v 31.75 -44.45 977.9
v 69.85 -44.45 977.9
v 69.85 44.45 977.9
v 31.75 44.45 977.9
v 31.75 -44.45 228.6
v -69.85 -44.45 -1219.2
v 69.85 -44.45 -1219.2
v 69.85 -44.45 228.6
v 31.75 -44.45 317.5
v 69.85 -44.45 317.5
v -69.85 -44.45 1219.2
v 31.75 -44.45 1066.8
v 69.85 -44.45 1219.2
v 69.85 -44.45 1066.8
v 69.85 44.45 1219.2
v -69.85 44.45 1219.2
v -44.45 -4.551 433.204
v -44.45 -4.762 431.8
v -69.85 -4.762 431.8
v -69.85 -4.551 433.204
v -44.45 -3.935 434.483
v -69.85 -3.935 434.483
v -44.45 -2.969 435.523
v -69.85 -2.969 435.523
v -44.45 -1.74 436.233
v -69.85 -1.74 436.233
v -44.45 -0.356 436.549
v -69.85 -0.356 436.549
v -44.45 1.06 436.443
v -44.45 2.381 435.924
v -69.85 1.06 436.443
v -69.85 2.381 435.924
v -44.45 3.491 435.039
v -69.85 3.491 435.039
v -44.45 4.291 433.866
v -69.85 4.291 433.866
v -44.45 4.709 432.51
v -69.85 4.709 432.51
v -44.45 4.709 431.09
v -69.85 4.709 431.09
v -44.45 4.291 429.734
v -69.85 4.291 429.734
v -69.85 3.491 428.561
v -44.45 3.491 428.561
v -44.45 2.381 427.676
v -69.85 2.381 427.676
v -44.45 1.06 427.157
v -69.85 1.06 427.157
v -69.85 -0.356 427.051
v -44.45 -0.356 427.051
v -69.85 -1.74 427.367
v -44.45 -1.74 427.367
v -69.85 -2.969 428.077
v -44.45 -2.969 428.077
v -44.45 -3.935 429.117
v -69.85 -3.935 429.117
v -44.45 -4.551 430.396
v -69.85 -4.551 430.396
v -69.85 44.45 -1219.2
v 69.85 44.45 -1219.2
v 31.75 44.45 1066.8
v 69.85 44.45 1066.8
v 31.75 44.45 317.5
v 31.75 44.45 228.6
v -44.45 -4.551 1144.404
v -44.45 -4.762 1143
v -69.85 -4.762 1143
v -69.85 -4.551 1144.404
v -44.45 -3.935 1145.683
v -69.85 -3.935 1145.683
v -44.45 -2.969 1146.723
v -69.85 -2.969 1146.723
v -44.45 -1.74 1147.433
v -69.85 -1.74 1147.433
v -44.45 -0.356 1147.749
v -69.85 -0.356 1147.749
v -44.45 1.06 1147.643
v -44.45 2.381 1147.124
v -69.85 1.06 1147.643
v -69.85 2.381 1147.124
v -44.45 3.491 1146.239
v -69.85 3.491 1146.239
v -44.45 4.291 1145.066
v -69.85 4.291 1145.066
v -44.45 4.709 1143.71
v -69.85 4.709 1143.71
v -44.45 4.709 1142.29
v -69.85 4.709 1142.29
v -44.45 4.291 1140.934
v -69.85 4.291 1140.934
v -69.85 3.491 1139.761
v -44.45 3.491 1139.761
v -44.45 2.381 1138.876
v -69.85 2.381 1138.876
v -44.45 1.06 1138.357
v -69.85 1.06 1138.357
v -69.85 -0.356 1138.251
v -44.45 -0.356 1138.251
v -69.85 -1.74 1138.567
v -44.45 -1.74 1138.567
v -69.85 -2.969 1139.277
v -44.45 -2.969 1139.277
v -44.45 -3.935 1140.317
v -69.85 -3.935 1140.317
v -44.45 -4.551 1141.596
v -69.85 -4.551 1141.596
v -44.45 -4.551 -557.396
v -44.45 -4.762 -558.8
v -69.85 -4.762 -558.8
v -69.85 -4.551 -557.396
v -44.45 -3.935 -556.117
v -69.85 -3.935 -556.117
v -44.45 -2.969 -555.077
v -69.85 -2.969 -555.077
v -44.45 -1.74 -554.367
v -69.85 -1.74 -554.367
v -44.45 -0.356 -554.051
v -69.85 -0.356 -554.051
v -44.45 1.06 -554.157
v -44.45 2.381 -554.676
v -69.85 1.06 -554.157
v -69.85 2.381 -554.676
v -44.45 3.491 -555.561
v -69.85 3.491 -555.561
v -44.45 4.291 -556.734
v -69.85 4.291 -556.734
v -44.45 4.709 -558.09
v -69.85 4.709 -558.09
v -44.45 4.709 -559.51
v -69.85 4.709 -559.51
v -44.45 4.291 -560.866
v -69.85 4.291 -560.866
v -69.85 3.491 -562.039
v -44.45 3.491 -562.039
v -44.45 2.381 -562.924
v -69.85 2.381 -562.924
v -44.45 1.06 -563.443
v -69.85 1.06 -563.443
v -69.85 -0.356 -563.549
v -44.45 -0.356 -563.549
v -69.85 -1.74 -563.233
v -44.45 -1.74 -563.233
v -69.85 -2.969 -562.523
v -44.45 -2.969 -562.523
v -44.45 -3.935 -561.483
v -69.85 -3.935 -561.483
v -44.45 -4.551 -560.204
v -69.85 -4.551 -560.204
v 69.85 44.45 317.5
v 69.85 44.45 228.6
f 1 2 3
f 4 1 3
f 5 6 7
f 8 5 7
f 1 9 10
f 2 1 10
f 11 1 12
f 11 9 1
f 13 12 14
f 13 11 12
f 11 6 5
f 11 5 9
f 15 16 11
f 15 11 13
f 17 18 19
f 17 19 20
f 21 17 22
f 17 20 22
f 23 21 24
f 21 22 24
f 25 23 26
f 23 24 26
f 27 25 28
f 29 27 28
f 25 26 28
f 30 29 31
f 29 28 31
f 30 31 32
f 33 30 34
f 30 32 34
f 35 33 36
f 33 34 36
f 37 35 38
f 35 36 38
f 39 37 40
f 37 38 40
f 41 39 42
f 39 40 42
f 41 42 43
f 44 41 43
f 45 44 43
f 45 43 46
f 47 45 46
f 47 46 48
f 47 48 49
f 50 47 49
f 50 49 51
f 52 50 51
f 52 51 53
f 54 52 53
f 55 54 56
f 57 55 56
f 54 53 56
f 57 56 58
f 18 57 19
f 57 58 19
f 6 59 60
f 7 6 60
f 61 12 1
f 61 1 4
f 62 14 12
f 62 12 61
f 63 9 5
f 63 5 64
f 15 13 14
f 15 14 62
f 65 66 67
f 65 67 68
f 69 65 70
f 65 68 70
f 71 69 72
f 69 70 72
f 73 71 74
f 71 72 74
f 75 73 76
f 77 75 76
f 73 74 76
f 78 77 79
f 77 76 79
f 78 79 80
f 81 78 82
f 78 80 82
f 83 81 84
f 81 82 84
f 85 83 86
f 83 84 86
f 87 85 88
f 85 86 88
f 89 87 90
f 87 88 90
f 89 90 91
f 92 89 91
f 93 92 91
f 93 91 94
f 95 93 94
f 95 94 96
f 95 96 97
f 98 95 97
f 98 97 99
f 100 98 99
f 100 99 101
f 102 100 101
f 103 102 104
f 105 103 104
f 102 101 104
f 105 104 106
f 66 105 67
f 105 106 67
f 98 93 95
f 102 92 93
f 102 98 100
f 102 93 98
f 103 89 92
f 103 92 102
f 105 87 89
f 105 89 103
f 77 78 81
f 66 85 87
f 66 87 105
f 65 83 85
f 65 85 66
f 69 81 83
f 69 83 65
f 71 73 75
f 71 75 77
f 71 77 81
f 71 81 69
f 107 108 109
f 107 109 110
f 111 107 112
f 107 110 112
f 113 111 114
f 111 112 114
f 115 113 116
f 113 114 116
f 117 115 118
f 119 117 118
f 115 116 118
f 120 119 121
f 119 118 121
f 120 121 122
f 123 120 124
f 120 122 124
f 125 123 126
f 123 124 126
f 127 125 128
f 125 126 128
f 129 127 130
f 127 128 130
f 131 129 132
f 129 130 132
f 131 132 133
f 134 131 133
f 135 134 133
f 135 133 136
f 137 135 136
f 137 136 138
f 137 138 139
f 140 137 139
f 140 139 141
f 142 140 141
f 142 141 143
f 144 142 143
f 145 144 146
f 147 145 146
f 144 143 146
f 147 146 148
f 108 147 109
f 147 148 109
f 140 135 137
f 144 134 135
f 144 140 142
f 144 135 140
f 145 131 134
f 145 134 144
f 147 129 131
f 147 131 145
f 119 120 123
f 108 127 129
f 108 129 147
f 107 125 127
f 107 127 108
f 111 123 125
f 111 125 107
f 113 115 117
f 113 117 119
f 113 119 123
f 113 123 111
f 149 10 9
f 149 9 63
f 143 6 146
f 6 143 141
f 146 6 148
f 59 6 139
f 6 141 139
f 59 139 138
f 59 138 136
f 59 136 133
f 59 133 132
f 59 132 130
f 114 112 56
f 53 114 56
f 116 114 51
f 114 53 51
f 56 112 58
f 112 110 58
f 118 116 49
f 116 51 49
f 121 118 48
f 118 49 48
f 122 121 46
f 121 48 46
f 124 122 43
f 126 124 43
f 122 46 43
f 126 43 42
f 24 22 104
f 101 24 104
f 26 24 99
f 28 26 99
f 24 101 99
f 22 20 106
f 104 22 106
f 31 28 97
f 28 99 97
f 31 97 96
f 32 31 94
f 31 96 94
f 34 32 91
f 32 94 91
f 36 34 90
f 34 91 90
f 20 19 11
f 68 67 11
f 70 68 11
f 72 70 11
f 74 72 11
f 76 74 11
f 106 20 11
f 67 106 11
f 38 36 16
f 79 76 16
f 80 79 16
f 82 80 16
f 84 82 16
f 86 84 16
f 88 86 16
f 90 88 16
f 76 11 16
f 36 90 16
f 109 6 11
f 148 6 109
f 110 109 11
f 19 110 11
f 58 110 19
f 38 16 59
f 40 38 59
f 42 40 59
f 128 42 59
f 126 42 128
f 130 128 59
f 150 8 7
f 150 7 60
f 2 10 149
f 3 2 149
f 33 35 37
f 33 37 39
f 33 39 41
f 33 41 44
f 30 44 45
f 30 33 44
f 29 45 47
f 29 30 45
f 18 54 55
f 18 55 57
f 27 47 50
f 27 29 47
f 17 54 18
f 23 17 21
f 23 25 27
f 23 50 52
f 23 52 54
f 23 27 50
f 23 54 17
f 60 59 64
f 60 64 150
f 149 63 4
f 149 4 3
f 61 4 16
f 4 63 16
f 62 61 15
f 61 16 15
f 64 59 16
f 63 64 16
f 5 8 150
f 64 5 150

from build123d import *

# Parameters (mm, degrees)
F0_W     = 139.7
F0_H     = 88.9
F1_DEPTH = 1219.2
F2_W     = 88.9
F2_H     = 88.9
F3_DEPTH = 38.1
F4_R     = 4.7625
F5_DEPTH = 25.4


with BuildPart() as f1:
    # F0 (on Top) → F1 (new body, symmetric)
    with BuildSketch(Plane.XY):
        Rectangle(F0_W, F0_H)
    extrude(amount=F1_DEPTH, both=True)

    # F2 (on face) → F3 (cut)
    with BuildSketch(Plane.YZ.offset(69.85)):
        with Locations((0, 1022.35)):
            Rectangle(F2_W, F2_H)
        with Locations((0, 273.05)):
            Rectangle(F2_W, F2_H)
    extrude(amount=-F3_DEPTH, mode=Mode.SUBTRACT)

    # F4 (on face) → F5 (cut)
    with BuildSketch(Plane(origin=(-69.85, 0, 0), x_dir=(0, -1, 0), z_dir=(-1, 0, 0))):
        with Locations((0, -558.8)):
            Circle(F4_R)
        with Locations((0, 1143)):
            Circle(F4_R)
        with Locations((0, 431.8)):
            Circle(F4_R)
    extrude(amount=-F5_DEPTH, mode=Mode.SUBTRACT)


solid = f1.part
